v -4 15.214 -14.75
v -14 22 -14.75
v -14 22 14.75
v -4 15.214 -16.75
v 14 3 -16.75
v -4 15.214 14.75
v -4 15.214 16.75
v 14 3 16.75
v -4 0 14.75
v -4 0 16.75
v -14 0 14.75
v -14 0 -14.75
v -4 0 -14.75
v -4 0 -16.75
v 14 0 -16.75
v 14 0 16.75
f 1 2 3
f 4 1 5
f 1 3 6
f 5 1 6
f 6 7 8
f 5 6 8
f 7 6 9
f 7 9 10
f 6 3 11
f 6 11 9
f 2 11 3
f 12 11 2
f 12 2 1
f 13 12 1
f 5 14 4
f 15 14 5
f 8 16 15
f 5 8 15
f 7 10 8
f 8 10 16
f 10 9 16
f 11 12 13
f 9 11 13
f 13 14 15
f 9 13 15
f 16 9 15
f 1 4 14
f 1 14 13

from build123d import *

# Parameters (mm, degrees)
SKETCH1_W           = 28
SKETCH1_H           = 33.5
BOSS_EXTRUDE1_DEPTH = 22
CUT_EXTRUDE1_DEPTH  = 44
SKETCH4_W           = 10
SKETCH4_H           = 2
CUT_EXTRUDE3_DEPTH  = 49


with BuildPart() as part:
    # Sketch1 → Boss-Extrude1 (new body)
    with BuildSketch(Plane(origin=(0, 0, 0), x_dir=(1, 0, 0), z_dir=(0, 1, 0))):
        Rectangle(SKETCH1_W, SKETCH1_H)
    extrude(amount=BOSS_EXTRUDE1_DEPTH)

    # Sketch3 → Cut-Extrude1 (cut)
    with BuildSketch(Plane.XY.offset(16.75)):
        Polygon((14, 22), (-14, 22), (14, 3), align=None)
    extrude(amount=-CUT_EXTRUDE1_DEPTH, mode=Mode.SUBTRACT)

    # Sketch4 → Cut-Extrude3 (cut)
    with BuildSketch(Plane.XZ):
        with Locations((-9, 15.75)):
            Rectangle(SKETCH4_W, SKETCH4_H)
        with Locations((-9, -15.75)):
            Rectangle(SKETCH4_W, SKETCH4_H)
    extrude(amount=-CUT_EXTRUDE3_DEPTH, mode=Mode.SUBTRACT)


solid = part.part
